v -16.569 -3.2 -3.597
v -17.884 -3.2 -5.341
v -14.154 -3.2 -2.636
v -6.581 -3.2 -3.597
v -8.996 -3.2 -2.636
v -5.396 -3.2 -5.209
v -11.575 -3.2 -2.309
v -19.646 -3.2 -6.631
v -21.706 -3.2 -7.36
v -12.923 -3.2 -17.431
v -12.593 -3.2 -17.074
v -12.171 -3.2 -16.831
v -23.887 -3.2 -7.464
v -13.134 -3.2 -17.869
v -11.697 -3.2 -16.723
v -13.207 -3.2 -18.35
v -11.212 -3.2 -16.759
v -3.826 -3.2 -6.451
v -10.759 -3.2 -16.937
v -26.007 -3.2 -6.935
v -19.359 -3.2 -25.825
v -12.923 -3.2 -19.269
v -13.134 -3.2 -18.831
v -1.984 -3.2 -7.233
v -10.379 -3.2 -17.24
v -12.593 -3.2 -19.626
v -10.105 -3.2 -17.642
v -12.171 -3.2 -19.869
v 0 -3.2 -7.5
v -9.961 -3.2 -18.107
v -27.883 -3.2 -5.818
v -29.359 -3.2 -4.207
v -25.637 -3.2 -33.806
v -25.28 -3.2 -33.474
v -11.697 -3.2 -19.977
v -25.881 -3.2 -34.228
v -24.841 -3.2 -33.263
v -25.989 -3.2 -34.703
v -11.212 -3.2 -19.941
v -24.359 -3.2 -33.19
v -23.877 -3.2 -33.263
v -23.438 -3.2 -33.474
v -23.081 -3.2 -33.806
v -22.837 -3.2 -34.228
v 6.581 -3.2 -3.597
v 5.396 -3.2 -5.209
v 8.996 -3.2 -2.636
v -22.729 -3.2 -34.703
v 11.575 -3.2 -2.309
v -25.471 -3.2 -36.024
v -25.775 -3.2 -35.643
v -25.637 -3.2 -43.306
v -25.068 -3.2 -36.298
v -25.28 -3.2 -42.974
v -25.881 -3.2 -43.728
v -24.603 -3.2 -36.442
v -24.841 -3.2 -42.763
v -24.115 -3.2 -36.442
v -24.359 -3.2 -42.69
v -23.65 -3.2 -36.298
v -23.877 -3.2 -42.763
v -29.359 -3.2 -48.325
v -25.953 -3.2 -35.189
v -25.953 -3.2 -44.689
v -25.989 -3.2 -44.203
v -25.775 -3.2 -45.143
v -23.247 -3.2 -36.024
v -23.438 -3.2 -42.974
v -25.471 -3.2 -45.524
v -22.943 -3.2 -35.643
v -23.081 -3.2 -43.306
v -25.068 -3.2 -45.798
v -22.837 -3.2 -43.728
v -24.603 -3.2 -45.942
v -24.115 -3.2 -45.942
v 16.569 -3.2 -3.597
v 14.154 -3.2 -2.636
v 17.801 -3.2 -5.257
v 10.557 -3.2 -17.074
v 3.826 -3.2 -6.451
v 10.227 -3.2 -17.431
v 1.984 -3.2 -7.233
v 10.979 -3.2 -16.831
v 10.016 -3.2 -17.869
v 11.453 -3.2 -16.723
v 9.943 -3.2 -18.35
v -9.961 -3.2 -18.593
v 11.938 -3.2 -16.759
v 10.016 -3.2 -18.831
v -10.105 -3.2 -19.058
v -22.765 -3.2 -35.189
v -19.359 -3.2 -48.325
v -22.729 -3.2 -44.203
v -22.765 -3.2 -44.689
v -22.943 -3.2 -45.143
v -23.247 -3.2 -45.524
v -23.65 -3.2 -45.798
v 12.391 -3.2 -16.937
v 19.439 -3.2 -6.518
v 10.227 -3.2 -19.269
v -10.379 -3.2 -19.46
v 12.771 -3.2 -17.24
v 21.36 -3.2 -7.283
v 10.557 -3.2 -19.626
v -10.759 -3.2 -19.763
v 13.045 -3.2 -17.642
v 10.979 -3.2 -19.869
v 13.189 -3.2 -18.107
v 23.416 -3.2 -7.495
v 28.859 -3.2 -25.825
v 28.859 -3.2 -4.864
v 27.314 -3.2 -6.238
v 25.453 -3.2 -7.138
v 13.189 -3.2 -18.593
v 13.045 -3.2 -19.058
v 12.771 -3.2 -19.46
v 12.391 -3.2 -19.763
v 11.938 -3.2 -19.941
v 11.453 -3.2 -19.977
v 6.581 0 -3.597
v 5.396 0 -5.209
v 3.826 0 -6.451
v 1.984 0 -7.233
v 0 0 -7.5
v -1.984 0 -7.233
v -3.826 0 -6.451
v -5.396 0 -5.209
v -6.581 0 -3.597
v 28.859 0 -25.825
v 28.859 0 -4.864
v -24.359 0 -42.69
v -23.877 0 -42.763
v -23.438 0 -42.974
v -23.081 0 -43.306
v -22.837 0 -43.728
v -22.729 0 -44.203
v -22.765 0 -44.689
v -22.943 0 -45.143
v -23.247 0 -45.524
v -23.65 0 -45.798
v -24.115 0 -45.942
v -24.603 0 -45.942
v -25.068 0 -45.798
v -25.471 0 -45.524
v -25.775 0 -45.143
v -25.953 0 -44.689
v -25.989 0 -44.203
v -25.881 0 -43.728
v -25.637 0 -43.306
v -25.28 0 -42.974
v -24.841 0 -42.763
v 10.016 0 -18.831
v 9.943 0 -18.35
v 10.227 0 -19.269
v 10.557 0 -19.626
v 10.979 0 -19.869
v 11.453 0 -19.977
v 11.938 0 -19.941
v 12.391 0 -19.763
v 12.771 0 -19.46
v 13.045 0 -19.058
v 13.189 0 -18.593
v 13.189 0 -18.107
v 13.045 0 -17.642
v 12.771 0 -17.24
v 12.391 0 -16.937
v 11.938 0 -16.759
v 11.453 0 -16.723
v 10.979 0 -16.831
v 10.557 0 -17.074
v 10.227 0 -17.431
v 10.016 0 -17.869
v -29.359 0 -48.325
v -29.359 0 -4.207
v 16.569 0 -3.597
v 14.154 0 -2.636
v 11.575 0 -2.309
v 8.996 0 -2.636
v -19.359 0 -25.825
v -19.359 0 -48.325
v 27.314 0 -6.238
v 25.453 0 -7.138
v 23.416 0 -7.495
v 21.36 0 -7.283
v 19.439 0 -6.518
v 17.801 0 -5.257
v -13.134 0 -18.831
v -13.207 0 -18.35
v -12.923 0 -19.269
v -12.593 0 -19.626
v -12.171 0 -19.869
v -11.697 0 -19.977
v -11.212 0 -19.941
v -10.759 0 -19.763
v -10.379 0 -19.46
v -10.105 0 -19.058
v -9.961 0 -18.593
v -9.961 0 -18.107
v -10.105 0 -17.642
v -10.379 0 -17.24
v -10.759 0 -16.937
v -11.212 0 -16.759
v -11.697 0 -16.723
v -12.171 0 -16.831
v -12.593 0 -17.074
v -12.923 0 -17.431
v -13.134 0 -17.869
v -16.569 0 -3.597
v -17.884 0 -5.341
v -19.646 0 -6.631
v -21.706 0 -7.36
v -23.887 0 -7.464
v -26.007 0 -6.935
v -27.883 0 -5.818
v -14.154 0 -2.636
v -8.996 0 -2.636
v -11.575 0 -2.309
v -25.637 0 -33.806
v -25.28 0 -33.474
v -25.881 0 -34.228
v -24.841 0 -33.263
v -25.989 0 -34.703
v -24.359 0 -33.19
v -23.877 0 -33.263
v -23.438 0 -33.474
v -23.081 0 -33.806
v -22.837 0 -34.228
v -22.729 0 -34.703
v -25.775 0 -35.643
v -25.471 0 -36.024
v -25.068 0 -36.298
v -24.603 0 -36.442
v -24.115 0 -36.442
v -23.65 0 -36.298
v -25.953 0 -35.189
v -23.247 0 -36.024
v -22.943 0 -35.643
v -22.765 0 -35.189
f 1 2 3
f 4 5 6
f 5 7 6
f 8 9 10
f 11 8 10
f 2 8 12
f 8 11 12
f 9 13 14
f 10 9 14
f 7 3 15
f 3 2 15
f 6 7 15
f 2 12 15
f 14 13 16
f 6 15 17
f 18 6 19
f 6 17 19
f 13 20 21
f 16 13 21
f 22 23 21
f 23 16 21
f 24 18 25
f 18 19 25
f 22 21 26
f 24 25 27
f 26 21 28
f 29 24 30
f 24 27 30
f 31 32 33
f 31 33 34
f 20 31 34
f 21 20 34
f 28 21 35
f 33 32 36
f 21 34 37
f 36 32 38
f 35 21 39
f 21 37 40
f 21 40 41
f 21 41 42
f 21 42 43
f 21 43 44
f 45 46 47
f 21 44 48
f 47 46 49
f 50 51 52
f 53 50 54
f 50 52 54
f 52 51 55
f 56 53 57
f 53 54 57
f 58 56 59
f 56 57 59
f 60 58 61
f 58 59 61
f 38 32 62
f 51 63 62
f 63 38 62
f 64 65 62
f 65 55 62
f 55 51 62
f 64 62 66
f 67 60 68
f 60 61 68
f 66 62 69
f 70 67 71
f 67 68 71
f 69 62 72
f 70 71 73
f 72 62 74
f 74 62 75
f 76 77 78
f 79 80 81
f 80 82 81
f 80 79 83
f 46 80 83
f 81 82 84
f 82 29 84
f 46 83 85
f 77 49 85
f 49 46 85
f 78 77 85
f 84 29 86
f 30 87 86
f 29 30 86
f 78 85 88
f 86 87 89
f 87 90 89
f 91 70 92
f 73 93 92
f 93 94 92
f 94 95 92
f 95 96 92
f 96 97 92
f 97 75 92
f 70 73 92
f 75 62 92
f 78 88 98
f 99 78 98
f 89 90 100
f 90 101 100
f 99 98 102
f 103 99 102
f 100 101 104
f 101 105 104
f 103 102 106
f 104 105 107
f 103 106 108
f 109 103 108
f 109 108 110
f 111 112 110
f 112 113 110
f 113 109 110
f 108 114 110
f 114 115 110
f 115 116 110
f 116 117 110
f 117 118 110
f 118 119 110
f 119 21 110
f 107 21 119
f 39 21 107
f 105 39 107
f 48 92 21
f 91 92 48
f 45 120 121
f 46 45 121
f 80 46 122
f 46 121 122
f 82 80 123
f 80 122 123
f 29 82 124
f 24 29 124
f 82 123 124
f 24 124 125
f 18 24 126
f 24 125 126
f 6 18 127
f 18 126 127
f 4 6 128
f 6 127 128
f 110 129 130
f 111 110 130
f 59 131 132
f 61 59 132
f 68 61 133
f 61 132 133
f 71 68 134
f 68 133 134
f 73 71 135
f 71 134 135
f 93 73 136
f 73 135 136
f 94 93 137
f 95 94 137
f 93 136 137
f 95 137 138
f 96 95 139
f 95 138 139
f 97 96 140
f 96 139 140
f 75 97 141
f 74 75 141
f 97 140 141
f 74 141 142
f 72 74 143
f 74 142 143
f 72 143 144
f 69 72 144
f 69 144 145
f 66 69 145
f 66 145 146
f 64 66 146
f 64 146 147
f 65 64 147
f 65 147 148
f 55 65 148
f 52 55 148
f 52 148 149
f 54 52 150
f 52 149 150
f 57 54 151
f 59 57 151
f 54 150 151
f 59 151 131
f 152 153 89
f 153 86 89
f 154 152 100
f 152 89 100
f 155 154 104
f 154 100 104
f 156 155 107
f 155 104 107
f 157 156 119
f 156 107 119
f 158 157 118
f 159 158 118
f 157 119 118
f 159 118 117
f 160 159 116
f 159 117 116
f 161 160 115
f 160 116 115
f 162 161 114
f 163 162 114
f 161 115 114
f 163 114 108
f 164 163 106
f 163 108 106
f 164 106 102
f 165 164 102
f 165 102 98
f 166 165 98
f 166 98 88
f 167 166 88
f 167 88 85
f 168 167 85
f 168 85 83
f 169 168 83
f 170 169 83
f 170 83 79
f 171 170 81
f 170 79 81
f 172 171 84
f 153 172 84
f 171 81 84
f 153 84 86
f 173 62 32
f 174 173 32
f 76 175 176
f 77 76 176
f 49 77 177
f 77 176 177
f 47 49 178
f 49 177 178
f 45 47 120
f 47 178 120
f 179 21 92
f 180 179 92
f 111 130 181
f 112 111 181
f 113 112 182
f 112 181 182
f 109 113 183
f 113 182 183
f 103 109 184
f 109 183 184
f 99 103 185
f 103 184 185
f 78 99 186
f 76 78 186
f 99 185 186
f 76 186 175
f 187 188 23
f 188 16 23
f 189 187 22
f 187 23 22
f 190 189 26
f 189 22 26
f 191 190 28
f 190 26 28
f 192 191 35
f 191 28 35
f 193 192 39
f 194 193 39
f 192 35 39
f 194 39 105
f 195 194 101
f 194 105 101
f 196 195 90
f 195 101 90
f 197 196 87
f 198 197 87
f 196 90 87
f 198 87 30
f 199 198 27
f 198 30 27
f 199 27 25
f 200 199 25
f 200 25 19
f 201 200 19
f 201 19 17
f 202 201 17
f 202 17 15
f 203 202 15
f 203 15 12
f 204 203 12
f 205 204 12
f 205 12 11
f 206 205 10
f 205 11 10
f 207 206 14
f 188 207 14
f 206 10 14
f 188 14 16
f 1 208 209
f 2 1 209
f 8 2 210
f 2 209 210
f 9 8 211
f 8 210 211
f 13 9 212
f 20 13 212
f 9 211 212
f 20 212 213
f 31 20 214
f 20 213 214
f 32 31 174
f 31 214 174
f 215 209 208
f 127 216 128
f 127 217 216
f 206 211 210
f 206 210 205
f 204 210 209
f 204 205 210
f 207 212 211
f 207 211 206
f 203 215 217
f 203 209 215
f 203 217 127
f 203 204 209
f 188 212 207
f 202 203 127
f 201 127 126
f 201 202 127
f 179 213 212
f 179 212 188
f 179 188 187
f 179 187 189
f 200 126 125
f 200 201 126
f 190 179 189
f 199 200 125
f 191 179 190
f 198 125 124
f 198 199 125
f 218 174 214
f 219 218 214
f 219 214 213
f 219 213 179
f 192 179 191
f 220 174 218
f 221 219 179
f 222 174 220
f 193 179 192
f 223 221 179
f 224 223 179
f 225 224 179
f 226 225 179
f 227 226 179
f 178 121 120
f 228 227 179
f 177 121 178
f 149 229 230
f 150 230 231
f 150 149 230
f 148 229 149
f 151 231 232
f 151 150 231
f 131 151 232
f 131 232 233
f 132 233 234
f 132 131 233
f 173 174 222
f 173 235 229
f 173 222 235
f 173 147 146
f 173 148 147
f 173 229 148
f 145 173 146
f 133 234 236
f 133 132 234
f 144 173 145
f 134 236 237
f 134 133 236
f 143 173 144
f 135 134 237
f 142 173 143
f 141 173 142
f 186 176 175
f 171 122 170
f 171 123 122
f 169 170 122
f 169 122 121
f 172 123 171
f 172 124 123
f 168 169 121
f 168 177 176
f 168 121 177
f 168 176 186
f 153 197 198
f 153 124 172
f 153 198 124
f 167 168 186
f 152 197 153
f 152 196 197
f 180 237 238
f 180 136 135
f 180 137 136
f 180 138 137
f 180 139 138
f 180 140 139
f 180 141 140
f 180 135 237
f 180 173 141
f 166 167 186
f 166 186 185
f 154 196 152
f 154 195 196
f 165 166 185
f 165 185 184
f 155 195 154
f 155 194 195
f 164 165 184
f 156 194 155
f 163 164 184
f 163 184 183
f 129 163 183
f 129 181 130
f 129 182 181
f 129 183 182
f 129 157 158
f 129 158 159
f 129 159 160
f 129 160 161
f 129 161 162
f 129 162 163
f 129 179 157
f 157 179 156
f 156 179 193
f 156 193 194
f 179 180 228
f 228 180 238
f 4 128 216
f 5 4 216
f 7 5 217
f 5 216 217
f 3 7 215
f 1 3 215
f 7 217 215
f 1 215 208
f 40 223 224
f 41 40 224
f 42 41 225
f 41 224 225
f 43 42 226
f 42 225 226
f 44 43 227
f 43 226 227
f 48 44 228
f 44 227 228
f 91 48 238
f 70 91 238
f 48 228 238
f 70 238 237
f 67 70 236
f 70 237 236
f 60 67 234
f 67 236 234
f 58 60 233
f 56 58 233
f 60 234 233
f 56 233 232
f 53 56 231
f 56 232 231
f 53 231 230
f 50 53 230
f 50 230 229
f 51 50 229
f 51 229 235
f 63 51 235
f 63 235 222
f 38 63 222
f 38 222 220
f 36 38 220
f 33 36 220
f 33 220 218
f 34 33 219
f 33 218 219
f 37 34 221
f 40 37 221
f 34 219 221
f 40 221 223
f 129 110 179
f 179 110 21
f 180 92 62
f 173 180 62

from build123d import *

# Parameters (mm, degrees)
BASE_FLANGE1_START        = -3.2
BASE_FLANGE1_DEPTH        = 3.2
SKETCH8_R                 = 1.635
CUT_EXTRUDE1_DEPTH        = 3.2
F_4_CLEARANCE_HOLE1_D     = 3.2639
F_4_CLEARANCE_HOLE1_DEPTH = 3.2
F_4_CLEARANCE_HOLE1_TIP   = 0.980574487
CUT_EXTRUDE2_DEPTH        = 3.2


# Read off the part's stored shape, not the designer's step: Base-Flange1
with BuildPart() as part:
    # Base-Flange1 outline → Base-Flange1 (new body)
    with BuildSketch(Plane(origin=(0, 0, 0), x_dir=(1, 0, 0), z_dir=(0, 1, 0)).offset(BASE_FLANGE1_START)):
        with BuildLine():
            ThreePointArc((-29.358964924, 3.232453337), (-23.15, 7), (-16.941035076, 3.232453337))
            ThreePointArc((-16.941035076, 3.232453337), (-11.575, 1.808851774), (-6.208964924, 3.232453337))
            ThreePointArc((-6.208964924, 3.232453337), (0, 7), (6.208964924, 3.232453337))
            ThreePointArc((6.208964924, 3.232453337), (11.575, 1.808851774), (16.941035076, 3.232453337))
            ThreePointArc((16.941035076, 3.232453337), (23.15, 7), (29.358964924, 3.232453337))
            Line((29.358964924, 3.232453337), (29.358964924, 25.825))
            Line((29.358964924, 25.825), (-19.358964924, 25.825))
            Line((-19.358964924, 25.825), (-19.358964924, 48.325))
            Line((-19.358964924, 48.325), (-29.358964924, 48.325))
            Line((-29.358964924, 48.325), (-29.358964924, 3.232453337))
        make_face()
    extrude(amount=BASE_FLANGE1_DEPTH)

    # Sketch8 → Cut-Extrude1 (cut)
    with BuildSketch(Plane(origin=(0, 0, 0), x_dir=(1, 0, 0), z_dir=(0, 1, 0))):
        with Locations(Location((-24.358964924, 44.325, 0), (0, 0, 270))):
            Circle(SKETCH8_R)
        with Locations(Location((-24.358964924, 34.825, 0), (0, 0, 270))):
            Circle(SKETCH8_R)
    extrude(amount=-CUT_EXTRUDE1_DEPTH, mode=Mode.SUBTRACT)

    # #4 Clearance Hole1
    with Locations(Plane(origin=(0, 0, 0), x_dir=(1, 0, 0), z_dir=(0, 1, 0))):
        with Locations((11.575, 18.35), (-11.575, 18.35)):
            Hole(F_4_CLEARANCE_HOLE1_D / 2, depth=F_4_CLEARANCE_HOLE1_DEPTH)
            with Locations((0, 0, -(F_4_CLEARANCE_HOLE1_DEPTH + F_4_CLEARANCE_HOLE1_TIP / 2))):  # 118° drill point
                Cone(0, F_4_CLEARANCE_HOLE1_D / 2, F_4_CLEARANCE_HOLE1_TIP, mode=Mode.SUBTRACT)

    # Sketch12 → Cut-Extrude2 (cut)
    with BuildSketch(Plane(origin=(0, 0, 0), x_dir=(1, 0, 0), z_dir=(0, 1, 0))):
        with BuildLine():
            Line((-29.802462418, 3.463342862), (-29.802462418, -1.121913875))
            Line((-29.802462418, -1.121913875), (35.30589457, -1.121913875))
            Line((35.30589457, -1.121913875), (35.30589457, 25.825))
            Line((35.30589457, 25.825), (28.858964924, 25.825))
            Line((28.858964924, 25.825), (28.858964924, 4.863920178))
            ThreePointArc((28.858964924, 4.863920178), (22.380832381, 7.460454488), (16.568740084, 3.596806627))
            ThreePointArc((16.568740084, 3.596806627), (11.575, 2.308851774), (6.581259916, 3.596806627))
            ThreePointArc((6.581259916, 3.596806627), (0, 7.5), (-6.581259916, 3.596806627))
            ThreePointArc((-6.581259916, 3.596806627), (-11.575, 2.308851774), (-16.568740084, 3.596806627))
            ThreePointArc((-16.568740084, 3.596806627), (-23.225634604, 7.499618617), (-29.802462418, 3.463342862))
        make_face()
    extrude(amount=-CUT_EXTRUDE2_DEPTH, mode=Mode.SUBTRACT)


solid = part.part
